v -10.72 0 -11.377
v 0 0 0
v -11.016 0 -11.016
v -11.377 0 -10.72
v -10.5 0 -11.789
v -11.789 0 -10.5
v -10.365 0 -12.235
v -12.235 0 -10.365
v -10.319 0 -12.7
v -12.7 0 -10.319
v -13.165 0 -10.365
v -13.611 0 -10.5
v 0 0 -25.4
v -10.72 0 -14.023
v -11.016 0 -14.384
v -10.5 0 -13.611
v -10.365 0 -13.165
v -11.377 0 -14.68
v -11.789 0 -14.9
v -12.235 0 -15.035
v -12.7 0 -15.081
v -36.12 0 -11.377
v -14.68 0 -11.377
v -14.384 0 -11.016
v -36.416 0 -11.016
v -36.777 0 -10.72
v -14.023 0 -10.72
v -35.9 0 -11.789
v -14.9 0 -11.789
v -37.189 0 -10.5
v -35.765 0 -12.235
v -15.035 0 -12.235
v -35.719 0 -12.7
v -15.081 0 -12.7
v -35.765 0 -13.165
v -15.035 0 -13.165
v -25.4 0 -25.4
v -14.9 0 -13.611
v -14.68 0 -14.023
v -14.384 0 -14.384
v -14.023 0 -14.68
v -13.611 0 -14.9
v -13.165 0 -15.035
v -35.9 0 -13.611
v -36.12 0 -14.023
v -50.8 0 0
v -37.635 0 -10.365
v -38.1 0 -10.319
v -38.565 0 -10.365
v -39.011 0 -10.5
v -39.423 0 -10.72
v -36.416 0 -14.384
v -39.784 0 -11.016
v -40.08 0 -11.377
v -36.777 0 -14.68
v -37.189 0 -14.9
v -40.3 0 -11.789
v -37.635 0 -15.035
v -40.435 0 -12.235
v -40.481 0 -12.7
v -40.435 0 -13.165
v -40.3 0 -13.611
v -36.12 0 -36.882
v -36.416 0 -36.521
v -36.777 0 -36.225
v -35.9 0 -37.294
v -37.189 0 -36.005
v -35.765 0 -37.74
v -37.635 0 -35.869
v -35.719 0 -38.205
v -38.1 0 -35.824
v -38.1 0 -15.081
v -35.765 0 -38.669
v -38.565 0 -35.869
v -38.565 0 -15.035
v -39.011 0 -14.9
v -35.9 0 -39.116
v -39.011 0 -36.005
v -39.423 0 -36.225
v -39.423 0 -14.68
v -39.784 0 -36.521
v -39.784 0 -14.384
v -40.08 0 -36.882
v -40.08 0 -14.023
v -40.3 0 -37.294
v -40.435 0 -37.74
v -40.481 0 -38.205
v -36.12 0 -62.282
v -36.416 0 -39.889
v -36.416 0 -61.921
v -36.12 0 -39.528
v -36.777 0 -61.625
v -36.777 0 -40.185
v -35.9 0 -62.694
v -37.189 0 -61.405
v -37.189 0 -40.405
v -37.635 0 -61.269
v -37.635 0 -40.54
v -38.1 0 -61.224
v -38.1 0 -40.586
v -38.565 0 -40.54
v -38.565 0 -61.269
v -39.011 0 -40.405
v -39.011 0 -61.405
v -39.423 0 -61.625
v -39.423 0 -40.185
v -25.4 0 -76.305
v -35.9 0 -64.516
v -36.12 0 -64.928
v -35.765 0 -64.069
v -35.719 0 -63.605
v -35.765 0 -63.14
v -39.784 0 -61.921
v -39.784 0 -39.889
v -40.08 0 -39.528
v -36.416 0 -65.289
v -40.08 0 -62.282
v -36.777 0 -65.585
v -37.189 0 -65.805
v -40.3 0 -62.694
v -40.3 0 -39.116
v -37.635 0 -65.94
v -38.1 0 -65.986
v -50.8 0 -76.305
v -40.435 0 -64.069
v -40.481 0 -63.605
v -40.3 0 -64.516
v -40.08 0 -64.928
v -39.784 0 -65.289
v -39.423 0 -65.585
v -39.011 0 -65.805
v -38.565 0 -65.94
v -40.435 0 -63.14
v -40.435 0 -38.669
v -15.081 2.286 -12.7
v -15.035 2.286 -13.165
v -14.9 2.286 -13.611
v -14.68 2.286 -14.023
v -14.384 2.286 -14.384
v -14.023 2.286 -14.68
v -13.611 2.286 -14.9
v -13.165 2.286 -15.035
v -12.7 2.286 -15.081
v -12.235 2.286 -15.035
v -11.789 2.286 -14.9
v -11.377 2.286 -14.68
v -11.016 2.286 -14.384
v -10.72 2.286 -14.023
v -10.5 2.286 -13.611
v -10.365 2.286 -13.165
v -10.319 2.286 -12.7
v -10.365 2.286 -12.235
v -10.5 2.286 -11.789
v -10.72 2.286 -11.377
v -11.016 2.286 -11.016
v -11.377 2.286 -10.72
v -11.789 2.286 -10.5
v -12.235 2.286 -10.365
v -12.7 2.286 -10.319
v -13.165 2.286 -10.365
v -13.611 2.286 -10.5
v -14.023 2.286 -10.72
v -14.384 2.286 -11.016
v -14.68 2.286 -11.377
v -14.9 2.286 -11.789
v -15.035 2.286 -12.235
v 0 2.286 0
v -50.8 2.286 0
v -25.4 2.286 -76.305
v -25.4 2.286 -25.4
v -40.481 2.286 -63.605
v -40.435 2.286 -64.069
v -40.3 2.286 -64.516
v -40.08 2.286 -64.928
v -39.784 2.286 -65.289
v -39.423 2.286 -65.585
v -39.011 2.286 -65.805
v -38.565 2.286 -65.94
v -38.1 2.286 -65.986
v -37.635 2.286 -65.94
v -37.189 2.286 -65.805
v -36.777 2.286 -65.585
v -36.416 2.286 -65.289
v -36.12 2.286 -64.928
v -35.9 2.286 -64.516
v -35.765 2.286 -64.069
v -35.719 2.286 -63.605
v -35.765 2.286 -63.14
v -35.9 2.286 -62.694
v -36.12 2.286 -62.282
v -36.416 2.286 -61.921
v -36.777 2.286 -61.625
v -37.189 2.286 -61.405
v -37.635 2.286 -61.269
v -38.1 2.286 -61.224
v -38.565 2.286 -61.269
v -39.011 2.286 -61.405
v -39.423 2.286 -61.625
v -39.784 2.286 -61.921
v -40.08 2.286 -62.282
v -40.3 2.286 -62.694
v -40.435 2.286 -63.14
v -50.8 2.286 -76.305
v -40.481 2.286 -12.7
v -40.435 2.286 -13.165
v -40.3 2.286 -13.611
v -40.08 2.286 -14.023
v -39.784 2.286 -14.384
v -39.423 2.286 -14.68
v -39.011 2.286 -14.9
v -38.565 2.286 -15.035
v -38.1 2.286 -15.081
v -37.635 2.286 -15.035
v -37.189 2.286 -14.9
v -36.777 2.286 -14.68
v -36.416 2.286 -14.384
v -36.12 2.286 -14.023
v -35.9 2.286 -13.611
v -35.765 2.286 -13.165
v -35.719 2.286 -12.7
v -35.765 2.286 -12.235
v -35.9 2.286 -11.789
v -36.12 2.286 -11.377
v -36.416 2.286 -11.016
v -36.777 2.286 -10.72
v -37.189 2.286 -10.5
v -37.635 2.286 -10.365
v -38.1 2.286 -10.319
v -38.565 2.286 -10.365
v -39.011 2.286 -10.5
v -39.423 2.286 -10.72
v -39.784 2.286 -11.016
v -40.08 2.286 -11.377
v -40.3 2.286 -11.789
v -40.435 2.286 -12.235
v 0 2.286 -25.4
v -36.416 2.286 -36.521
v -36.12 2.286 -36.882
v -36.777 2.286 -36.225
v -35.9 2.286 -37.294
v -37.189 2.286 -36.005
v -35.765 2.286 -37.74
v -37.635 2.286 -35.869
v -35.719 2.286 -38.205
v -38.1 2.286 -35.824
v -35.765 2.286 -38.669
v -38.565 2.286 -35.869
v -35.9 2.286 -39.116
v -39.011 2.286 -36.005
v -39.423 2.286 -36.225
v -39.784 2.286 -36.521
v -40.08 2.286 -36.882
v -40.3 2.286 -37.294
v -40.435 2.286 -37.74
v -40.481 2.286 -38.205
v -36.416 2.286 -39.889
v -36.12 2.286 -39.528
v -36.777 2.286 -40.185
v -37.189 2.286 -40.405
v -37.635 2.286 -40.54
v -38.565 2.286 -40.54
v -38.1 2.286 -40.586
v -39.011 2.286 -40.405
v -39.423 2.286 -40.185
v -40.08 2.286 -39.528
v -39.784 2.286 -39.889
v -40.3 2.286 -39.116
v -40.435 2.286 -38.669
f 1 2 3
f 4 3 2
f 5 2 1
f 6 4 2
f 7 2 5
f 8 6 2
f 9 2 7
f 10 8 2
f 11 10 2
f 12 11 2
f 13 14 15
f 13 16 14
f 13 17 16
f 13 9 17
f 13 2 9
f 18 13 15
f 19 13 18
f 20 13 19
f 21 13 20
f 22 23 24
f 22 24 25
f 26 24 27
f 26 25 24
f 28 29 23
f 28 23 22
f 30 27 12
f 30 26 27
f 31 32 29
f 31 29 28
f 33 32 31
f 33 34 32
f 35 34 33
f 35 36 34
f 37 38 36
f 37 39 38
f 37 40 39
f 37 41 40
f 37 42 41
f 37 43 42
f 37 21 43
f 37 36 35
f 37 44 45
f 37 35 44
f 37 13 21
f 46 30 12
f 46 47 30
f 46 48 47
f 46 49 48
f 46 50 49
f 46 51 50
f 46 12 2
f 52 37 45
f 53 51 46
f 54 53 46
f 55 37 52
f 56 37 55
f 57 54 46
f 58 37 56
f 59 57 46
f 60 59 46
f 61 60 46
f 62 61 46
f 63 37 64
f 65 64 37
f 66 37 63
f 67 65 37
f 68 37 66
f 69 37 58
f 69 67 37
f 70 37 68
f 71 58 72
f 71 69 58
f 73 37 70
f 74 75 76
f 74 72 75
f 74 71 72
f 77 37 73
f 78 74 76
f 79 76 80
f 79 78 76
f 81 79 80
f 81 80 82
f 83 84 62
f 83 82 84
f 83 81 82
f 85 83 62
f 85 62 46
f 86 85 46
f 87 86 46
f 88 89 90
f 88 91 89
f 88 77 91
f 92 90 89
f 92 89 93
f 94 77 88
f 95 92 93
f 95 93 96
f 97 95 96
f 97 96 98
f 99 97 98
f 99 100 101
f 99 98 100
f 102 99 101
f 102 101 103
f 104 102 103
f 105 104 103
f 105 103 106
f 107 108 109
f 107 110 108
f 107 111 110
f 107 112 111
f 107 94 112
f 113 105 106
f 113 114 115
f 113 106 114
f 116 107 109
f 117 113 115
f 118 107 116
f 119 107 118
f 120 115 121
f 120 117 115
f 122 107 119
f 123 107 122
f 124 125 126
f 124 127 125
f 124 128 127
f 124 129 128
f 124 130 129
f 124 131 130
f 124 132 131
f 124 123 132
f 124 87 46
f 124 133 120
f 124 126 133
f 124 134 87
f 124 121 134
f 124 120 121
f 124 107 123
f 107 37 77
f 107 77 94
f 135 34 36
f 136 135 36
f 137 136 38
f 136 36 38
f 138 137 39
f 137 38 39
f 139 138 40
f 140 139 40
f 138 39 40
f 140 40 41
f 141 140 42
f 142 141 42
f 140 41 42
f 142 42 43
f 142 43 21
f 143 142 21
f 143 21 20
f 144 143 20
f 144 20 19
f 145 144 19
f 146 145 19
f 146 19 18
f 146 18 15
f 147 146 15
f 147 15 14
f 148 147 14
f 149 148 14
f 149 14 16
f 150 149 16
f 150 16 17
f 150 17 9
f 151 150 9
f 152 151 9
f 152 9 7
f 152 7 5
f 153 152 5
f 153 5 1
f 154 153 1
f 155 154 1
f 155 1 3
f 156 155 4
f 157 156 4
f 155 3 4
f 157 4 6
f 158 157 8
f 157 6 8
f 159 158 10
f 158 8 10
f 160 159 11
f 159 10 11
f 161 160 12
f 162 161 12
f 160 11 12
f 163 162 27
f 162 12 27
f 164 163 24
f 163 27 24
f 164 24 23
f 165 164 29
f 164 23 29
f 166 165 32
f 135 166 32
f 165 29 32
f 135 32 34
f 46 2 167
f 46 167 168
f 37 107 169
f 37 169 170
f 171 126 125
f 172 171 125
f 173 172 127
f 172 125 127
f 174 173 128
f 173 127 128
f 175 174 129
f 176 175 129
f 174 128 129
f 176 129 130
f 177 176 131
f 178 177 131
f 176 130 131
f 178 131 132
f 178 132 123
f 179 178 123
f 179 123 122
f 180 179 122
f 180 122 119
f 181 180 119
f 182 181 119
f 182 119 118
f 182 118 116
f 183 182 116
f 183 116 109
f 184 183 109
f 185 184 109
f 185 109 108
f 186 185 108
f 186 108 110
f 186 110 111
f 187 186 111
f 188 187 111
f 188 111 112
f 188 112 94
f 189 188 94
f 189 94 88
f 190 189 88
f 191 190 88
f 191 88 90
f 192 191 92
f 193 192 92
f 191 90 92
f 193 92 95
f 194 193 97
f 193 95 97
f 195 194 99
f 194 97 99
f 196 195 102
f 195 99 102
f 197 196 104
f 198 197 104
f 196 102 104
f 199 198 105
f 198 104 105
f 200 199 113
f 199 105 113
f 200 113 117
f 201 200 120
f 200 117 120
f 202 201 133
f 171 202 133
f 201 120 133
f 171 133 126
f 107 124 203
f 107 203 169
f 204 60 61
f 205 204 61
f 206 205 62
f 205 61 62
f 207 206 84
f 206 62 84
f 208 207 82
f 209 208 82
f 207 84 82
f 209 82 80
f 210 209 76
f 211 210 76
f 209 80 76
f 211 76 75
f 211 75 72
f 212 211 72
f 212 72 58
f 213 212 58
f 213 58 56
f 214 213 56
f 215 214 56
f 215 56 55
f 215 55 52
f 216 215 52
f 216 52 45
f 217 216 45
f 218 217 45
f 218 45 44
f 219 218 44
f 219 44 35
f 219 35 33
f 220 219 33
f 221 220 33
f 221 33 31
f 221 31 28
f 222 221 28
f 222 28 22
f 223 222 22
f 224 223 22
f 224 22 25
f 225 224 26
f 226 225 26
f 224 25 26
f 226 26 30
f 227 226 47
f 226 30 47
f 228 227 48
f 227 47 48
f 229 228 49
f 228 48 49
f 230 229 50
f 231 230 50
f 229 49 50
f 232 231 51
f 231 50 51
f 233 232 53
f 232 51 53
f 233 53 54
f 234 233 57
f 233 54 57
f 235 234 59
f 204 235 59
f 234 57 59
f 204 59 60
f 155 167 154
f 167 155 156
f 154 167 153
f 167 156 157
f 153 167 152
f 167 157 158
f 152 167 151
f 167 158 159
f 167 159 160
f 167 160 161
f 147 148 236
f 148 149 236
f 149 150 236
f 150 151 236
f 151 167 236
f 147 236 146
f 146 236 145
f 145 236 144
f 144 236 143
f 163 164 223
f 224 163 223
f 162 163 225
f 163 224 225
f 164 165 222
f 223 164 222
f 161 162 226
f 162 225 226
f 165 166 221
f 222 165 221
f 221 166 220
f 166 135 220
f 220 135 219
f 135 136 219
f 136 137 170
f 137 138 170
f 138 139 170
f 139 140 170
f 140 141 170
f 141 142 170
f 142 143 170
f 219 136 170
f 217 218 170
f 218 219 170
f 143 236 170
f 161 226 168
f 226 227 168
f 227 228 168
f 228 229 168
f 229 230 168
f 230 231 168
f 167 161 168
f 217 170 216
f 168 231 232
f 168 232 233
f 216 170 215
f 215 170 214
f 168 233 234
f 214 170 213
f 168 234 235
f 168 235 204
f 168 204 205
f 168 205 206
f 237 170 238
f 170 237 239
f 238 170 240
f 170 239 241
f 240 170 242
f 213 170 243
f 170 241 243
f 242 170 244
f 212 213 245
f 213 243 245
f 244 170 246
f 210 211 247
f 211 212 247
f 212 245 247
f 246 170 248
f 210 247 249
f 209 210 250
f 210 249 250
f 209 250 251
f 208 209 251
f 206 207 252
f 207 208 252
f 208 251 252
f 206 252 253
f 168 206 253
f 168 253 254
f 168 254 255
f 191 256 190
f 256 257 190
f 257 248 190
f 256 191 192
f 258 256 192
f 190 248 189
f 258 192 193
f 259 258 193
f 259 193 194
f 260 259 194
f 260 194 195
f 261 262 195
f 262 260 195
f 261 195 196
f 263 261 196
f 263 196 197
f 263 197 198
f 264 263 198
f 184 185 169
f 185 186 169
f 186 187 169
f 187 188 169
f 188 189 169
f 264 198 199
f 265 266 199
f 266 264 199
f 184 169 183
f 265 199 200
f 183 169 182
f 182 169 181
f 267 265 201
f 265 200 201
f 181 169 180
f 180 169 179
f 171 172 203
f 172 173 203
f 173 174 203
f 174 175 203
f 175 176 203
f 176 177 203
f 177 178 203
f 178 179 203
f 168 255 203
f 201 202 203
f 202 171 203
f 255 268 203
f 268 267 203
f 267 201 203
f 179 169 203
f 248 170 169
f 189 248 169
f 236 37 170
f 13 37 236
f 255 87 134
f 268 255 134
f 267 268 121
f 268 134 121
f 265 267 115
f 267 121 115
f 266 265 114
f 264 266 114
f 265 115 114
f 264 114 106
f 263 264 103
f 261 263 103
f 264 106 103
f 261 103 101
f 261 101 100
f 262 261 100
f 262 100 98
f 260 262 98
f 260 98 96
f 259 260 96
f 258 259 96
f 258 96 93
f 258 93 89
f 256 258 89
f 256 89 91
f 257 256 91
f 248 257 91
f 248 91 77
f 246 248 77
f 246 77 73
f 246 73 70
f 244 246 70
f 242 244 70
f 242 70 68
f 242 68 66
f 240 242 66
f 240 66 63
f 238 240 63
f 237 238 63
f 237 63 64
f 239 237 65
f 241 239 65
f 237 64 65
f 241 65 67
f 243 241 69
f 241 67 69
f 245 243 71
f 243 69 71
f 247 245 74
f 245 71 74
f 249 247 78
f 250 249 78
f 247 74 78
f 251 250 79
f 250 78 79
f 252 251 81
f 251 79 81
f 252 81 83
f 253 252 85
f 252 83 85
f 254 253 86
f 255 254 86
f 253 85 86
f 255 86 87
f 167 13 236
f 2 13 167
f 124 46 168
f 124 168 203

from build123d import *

# Parameters (mm, degrees)
BOSS_EXTRUDE1_DEPTH            = 2.286
F_3_16_0_1875_DIAMETER_HOLE1_D = 4.7625


with BuildPart() as part:
    # Sketch1 → Boss-Extrude1 (new body)
    with BuildSketch(Plane(origin=(0, 0, 0), x_dir=(1, 0, 0), z_dir=(0, 1, 0))):
        Polygon((-25.4, 76.30478401), (-25.4, 25.4), (0, 25.4), (0, 0), (-50.8, 0), (-50.8, 76.30478401), align=None)
    extrude(amount=BOSS_EXTRUDE1_DEPTH)

    # 3/16 (0.1875) Diameter Hole1 (through all)
    with Locations(Plane(origin=(0, 2.286, 0), x_dir=(1, 0, 0), z_dir=(0, 1, 0))):
        with Locations((-38.1, 63.60478401), (-38.1, 38.20478401), (-38.1, 12.7), (-12.7, 12.7)):
            Hole(F_3_16_0_1875_DIAMETER_HOLE1_D / 2)


solid = part.part
